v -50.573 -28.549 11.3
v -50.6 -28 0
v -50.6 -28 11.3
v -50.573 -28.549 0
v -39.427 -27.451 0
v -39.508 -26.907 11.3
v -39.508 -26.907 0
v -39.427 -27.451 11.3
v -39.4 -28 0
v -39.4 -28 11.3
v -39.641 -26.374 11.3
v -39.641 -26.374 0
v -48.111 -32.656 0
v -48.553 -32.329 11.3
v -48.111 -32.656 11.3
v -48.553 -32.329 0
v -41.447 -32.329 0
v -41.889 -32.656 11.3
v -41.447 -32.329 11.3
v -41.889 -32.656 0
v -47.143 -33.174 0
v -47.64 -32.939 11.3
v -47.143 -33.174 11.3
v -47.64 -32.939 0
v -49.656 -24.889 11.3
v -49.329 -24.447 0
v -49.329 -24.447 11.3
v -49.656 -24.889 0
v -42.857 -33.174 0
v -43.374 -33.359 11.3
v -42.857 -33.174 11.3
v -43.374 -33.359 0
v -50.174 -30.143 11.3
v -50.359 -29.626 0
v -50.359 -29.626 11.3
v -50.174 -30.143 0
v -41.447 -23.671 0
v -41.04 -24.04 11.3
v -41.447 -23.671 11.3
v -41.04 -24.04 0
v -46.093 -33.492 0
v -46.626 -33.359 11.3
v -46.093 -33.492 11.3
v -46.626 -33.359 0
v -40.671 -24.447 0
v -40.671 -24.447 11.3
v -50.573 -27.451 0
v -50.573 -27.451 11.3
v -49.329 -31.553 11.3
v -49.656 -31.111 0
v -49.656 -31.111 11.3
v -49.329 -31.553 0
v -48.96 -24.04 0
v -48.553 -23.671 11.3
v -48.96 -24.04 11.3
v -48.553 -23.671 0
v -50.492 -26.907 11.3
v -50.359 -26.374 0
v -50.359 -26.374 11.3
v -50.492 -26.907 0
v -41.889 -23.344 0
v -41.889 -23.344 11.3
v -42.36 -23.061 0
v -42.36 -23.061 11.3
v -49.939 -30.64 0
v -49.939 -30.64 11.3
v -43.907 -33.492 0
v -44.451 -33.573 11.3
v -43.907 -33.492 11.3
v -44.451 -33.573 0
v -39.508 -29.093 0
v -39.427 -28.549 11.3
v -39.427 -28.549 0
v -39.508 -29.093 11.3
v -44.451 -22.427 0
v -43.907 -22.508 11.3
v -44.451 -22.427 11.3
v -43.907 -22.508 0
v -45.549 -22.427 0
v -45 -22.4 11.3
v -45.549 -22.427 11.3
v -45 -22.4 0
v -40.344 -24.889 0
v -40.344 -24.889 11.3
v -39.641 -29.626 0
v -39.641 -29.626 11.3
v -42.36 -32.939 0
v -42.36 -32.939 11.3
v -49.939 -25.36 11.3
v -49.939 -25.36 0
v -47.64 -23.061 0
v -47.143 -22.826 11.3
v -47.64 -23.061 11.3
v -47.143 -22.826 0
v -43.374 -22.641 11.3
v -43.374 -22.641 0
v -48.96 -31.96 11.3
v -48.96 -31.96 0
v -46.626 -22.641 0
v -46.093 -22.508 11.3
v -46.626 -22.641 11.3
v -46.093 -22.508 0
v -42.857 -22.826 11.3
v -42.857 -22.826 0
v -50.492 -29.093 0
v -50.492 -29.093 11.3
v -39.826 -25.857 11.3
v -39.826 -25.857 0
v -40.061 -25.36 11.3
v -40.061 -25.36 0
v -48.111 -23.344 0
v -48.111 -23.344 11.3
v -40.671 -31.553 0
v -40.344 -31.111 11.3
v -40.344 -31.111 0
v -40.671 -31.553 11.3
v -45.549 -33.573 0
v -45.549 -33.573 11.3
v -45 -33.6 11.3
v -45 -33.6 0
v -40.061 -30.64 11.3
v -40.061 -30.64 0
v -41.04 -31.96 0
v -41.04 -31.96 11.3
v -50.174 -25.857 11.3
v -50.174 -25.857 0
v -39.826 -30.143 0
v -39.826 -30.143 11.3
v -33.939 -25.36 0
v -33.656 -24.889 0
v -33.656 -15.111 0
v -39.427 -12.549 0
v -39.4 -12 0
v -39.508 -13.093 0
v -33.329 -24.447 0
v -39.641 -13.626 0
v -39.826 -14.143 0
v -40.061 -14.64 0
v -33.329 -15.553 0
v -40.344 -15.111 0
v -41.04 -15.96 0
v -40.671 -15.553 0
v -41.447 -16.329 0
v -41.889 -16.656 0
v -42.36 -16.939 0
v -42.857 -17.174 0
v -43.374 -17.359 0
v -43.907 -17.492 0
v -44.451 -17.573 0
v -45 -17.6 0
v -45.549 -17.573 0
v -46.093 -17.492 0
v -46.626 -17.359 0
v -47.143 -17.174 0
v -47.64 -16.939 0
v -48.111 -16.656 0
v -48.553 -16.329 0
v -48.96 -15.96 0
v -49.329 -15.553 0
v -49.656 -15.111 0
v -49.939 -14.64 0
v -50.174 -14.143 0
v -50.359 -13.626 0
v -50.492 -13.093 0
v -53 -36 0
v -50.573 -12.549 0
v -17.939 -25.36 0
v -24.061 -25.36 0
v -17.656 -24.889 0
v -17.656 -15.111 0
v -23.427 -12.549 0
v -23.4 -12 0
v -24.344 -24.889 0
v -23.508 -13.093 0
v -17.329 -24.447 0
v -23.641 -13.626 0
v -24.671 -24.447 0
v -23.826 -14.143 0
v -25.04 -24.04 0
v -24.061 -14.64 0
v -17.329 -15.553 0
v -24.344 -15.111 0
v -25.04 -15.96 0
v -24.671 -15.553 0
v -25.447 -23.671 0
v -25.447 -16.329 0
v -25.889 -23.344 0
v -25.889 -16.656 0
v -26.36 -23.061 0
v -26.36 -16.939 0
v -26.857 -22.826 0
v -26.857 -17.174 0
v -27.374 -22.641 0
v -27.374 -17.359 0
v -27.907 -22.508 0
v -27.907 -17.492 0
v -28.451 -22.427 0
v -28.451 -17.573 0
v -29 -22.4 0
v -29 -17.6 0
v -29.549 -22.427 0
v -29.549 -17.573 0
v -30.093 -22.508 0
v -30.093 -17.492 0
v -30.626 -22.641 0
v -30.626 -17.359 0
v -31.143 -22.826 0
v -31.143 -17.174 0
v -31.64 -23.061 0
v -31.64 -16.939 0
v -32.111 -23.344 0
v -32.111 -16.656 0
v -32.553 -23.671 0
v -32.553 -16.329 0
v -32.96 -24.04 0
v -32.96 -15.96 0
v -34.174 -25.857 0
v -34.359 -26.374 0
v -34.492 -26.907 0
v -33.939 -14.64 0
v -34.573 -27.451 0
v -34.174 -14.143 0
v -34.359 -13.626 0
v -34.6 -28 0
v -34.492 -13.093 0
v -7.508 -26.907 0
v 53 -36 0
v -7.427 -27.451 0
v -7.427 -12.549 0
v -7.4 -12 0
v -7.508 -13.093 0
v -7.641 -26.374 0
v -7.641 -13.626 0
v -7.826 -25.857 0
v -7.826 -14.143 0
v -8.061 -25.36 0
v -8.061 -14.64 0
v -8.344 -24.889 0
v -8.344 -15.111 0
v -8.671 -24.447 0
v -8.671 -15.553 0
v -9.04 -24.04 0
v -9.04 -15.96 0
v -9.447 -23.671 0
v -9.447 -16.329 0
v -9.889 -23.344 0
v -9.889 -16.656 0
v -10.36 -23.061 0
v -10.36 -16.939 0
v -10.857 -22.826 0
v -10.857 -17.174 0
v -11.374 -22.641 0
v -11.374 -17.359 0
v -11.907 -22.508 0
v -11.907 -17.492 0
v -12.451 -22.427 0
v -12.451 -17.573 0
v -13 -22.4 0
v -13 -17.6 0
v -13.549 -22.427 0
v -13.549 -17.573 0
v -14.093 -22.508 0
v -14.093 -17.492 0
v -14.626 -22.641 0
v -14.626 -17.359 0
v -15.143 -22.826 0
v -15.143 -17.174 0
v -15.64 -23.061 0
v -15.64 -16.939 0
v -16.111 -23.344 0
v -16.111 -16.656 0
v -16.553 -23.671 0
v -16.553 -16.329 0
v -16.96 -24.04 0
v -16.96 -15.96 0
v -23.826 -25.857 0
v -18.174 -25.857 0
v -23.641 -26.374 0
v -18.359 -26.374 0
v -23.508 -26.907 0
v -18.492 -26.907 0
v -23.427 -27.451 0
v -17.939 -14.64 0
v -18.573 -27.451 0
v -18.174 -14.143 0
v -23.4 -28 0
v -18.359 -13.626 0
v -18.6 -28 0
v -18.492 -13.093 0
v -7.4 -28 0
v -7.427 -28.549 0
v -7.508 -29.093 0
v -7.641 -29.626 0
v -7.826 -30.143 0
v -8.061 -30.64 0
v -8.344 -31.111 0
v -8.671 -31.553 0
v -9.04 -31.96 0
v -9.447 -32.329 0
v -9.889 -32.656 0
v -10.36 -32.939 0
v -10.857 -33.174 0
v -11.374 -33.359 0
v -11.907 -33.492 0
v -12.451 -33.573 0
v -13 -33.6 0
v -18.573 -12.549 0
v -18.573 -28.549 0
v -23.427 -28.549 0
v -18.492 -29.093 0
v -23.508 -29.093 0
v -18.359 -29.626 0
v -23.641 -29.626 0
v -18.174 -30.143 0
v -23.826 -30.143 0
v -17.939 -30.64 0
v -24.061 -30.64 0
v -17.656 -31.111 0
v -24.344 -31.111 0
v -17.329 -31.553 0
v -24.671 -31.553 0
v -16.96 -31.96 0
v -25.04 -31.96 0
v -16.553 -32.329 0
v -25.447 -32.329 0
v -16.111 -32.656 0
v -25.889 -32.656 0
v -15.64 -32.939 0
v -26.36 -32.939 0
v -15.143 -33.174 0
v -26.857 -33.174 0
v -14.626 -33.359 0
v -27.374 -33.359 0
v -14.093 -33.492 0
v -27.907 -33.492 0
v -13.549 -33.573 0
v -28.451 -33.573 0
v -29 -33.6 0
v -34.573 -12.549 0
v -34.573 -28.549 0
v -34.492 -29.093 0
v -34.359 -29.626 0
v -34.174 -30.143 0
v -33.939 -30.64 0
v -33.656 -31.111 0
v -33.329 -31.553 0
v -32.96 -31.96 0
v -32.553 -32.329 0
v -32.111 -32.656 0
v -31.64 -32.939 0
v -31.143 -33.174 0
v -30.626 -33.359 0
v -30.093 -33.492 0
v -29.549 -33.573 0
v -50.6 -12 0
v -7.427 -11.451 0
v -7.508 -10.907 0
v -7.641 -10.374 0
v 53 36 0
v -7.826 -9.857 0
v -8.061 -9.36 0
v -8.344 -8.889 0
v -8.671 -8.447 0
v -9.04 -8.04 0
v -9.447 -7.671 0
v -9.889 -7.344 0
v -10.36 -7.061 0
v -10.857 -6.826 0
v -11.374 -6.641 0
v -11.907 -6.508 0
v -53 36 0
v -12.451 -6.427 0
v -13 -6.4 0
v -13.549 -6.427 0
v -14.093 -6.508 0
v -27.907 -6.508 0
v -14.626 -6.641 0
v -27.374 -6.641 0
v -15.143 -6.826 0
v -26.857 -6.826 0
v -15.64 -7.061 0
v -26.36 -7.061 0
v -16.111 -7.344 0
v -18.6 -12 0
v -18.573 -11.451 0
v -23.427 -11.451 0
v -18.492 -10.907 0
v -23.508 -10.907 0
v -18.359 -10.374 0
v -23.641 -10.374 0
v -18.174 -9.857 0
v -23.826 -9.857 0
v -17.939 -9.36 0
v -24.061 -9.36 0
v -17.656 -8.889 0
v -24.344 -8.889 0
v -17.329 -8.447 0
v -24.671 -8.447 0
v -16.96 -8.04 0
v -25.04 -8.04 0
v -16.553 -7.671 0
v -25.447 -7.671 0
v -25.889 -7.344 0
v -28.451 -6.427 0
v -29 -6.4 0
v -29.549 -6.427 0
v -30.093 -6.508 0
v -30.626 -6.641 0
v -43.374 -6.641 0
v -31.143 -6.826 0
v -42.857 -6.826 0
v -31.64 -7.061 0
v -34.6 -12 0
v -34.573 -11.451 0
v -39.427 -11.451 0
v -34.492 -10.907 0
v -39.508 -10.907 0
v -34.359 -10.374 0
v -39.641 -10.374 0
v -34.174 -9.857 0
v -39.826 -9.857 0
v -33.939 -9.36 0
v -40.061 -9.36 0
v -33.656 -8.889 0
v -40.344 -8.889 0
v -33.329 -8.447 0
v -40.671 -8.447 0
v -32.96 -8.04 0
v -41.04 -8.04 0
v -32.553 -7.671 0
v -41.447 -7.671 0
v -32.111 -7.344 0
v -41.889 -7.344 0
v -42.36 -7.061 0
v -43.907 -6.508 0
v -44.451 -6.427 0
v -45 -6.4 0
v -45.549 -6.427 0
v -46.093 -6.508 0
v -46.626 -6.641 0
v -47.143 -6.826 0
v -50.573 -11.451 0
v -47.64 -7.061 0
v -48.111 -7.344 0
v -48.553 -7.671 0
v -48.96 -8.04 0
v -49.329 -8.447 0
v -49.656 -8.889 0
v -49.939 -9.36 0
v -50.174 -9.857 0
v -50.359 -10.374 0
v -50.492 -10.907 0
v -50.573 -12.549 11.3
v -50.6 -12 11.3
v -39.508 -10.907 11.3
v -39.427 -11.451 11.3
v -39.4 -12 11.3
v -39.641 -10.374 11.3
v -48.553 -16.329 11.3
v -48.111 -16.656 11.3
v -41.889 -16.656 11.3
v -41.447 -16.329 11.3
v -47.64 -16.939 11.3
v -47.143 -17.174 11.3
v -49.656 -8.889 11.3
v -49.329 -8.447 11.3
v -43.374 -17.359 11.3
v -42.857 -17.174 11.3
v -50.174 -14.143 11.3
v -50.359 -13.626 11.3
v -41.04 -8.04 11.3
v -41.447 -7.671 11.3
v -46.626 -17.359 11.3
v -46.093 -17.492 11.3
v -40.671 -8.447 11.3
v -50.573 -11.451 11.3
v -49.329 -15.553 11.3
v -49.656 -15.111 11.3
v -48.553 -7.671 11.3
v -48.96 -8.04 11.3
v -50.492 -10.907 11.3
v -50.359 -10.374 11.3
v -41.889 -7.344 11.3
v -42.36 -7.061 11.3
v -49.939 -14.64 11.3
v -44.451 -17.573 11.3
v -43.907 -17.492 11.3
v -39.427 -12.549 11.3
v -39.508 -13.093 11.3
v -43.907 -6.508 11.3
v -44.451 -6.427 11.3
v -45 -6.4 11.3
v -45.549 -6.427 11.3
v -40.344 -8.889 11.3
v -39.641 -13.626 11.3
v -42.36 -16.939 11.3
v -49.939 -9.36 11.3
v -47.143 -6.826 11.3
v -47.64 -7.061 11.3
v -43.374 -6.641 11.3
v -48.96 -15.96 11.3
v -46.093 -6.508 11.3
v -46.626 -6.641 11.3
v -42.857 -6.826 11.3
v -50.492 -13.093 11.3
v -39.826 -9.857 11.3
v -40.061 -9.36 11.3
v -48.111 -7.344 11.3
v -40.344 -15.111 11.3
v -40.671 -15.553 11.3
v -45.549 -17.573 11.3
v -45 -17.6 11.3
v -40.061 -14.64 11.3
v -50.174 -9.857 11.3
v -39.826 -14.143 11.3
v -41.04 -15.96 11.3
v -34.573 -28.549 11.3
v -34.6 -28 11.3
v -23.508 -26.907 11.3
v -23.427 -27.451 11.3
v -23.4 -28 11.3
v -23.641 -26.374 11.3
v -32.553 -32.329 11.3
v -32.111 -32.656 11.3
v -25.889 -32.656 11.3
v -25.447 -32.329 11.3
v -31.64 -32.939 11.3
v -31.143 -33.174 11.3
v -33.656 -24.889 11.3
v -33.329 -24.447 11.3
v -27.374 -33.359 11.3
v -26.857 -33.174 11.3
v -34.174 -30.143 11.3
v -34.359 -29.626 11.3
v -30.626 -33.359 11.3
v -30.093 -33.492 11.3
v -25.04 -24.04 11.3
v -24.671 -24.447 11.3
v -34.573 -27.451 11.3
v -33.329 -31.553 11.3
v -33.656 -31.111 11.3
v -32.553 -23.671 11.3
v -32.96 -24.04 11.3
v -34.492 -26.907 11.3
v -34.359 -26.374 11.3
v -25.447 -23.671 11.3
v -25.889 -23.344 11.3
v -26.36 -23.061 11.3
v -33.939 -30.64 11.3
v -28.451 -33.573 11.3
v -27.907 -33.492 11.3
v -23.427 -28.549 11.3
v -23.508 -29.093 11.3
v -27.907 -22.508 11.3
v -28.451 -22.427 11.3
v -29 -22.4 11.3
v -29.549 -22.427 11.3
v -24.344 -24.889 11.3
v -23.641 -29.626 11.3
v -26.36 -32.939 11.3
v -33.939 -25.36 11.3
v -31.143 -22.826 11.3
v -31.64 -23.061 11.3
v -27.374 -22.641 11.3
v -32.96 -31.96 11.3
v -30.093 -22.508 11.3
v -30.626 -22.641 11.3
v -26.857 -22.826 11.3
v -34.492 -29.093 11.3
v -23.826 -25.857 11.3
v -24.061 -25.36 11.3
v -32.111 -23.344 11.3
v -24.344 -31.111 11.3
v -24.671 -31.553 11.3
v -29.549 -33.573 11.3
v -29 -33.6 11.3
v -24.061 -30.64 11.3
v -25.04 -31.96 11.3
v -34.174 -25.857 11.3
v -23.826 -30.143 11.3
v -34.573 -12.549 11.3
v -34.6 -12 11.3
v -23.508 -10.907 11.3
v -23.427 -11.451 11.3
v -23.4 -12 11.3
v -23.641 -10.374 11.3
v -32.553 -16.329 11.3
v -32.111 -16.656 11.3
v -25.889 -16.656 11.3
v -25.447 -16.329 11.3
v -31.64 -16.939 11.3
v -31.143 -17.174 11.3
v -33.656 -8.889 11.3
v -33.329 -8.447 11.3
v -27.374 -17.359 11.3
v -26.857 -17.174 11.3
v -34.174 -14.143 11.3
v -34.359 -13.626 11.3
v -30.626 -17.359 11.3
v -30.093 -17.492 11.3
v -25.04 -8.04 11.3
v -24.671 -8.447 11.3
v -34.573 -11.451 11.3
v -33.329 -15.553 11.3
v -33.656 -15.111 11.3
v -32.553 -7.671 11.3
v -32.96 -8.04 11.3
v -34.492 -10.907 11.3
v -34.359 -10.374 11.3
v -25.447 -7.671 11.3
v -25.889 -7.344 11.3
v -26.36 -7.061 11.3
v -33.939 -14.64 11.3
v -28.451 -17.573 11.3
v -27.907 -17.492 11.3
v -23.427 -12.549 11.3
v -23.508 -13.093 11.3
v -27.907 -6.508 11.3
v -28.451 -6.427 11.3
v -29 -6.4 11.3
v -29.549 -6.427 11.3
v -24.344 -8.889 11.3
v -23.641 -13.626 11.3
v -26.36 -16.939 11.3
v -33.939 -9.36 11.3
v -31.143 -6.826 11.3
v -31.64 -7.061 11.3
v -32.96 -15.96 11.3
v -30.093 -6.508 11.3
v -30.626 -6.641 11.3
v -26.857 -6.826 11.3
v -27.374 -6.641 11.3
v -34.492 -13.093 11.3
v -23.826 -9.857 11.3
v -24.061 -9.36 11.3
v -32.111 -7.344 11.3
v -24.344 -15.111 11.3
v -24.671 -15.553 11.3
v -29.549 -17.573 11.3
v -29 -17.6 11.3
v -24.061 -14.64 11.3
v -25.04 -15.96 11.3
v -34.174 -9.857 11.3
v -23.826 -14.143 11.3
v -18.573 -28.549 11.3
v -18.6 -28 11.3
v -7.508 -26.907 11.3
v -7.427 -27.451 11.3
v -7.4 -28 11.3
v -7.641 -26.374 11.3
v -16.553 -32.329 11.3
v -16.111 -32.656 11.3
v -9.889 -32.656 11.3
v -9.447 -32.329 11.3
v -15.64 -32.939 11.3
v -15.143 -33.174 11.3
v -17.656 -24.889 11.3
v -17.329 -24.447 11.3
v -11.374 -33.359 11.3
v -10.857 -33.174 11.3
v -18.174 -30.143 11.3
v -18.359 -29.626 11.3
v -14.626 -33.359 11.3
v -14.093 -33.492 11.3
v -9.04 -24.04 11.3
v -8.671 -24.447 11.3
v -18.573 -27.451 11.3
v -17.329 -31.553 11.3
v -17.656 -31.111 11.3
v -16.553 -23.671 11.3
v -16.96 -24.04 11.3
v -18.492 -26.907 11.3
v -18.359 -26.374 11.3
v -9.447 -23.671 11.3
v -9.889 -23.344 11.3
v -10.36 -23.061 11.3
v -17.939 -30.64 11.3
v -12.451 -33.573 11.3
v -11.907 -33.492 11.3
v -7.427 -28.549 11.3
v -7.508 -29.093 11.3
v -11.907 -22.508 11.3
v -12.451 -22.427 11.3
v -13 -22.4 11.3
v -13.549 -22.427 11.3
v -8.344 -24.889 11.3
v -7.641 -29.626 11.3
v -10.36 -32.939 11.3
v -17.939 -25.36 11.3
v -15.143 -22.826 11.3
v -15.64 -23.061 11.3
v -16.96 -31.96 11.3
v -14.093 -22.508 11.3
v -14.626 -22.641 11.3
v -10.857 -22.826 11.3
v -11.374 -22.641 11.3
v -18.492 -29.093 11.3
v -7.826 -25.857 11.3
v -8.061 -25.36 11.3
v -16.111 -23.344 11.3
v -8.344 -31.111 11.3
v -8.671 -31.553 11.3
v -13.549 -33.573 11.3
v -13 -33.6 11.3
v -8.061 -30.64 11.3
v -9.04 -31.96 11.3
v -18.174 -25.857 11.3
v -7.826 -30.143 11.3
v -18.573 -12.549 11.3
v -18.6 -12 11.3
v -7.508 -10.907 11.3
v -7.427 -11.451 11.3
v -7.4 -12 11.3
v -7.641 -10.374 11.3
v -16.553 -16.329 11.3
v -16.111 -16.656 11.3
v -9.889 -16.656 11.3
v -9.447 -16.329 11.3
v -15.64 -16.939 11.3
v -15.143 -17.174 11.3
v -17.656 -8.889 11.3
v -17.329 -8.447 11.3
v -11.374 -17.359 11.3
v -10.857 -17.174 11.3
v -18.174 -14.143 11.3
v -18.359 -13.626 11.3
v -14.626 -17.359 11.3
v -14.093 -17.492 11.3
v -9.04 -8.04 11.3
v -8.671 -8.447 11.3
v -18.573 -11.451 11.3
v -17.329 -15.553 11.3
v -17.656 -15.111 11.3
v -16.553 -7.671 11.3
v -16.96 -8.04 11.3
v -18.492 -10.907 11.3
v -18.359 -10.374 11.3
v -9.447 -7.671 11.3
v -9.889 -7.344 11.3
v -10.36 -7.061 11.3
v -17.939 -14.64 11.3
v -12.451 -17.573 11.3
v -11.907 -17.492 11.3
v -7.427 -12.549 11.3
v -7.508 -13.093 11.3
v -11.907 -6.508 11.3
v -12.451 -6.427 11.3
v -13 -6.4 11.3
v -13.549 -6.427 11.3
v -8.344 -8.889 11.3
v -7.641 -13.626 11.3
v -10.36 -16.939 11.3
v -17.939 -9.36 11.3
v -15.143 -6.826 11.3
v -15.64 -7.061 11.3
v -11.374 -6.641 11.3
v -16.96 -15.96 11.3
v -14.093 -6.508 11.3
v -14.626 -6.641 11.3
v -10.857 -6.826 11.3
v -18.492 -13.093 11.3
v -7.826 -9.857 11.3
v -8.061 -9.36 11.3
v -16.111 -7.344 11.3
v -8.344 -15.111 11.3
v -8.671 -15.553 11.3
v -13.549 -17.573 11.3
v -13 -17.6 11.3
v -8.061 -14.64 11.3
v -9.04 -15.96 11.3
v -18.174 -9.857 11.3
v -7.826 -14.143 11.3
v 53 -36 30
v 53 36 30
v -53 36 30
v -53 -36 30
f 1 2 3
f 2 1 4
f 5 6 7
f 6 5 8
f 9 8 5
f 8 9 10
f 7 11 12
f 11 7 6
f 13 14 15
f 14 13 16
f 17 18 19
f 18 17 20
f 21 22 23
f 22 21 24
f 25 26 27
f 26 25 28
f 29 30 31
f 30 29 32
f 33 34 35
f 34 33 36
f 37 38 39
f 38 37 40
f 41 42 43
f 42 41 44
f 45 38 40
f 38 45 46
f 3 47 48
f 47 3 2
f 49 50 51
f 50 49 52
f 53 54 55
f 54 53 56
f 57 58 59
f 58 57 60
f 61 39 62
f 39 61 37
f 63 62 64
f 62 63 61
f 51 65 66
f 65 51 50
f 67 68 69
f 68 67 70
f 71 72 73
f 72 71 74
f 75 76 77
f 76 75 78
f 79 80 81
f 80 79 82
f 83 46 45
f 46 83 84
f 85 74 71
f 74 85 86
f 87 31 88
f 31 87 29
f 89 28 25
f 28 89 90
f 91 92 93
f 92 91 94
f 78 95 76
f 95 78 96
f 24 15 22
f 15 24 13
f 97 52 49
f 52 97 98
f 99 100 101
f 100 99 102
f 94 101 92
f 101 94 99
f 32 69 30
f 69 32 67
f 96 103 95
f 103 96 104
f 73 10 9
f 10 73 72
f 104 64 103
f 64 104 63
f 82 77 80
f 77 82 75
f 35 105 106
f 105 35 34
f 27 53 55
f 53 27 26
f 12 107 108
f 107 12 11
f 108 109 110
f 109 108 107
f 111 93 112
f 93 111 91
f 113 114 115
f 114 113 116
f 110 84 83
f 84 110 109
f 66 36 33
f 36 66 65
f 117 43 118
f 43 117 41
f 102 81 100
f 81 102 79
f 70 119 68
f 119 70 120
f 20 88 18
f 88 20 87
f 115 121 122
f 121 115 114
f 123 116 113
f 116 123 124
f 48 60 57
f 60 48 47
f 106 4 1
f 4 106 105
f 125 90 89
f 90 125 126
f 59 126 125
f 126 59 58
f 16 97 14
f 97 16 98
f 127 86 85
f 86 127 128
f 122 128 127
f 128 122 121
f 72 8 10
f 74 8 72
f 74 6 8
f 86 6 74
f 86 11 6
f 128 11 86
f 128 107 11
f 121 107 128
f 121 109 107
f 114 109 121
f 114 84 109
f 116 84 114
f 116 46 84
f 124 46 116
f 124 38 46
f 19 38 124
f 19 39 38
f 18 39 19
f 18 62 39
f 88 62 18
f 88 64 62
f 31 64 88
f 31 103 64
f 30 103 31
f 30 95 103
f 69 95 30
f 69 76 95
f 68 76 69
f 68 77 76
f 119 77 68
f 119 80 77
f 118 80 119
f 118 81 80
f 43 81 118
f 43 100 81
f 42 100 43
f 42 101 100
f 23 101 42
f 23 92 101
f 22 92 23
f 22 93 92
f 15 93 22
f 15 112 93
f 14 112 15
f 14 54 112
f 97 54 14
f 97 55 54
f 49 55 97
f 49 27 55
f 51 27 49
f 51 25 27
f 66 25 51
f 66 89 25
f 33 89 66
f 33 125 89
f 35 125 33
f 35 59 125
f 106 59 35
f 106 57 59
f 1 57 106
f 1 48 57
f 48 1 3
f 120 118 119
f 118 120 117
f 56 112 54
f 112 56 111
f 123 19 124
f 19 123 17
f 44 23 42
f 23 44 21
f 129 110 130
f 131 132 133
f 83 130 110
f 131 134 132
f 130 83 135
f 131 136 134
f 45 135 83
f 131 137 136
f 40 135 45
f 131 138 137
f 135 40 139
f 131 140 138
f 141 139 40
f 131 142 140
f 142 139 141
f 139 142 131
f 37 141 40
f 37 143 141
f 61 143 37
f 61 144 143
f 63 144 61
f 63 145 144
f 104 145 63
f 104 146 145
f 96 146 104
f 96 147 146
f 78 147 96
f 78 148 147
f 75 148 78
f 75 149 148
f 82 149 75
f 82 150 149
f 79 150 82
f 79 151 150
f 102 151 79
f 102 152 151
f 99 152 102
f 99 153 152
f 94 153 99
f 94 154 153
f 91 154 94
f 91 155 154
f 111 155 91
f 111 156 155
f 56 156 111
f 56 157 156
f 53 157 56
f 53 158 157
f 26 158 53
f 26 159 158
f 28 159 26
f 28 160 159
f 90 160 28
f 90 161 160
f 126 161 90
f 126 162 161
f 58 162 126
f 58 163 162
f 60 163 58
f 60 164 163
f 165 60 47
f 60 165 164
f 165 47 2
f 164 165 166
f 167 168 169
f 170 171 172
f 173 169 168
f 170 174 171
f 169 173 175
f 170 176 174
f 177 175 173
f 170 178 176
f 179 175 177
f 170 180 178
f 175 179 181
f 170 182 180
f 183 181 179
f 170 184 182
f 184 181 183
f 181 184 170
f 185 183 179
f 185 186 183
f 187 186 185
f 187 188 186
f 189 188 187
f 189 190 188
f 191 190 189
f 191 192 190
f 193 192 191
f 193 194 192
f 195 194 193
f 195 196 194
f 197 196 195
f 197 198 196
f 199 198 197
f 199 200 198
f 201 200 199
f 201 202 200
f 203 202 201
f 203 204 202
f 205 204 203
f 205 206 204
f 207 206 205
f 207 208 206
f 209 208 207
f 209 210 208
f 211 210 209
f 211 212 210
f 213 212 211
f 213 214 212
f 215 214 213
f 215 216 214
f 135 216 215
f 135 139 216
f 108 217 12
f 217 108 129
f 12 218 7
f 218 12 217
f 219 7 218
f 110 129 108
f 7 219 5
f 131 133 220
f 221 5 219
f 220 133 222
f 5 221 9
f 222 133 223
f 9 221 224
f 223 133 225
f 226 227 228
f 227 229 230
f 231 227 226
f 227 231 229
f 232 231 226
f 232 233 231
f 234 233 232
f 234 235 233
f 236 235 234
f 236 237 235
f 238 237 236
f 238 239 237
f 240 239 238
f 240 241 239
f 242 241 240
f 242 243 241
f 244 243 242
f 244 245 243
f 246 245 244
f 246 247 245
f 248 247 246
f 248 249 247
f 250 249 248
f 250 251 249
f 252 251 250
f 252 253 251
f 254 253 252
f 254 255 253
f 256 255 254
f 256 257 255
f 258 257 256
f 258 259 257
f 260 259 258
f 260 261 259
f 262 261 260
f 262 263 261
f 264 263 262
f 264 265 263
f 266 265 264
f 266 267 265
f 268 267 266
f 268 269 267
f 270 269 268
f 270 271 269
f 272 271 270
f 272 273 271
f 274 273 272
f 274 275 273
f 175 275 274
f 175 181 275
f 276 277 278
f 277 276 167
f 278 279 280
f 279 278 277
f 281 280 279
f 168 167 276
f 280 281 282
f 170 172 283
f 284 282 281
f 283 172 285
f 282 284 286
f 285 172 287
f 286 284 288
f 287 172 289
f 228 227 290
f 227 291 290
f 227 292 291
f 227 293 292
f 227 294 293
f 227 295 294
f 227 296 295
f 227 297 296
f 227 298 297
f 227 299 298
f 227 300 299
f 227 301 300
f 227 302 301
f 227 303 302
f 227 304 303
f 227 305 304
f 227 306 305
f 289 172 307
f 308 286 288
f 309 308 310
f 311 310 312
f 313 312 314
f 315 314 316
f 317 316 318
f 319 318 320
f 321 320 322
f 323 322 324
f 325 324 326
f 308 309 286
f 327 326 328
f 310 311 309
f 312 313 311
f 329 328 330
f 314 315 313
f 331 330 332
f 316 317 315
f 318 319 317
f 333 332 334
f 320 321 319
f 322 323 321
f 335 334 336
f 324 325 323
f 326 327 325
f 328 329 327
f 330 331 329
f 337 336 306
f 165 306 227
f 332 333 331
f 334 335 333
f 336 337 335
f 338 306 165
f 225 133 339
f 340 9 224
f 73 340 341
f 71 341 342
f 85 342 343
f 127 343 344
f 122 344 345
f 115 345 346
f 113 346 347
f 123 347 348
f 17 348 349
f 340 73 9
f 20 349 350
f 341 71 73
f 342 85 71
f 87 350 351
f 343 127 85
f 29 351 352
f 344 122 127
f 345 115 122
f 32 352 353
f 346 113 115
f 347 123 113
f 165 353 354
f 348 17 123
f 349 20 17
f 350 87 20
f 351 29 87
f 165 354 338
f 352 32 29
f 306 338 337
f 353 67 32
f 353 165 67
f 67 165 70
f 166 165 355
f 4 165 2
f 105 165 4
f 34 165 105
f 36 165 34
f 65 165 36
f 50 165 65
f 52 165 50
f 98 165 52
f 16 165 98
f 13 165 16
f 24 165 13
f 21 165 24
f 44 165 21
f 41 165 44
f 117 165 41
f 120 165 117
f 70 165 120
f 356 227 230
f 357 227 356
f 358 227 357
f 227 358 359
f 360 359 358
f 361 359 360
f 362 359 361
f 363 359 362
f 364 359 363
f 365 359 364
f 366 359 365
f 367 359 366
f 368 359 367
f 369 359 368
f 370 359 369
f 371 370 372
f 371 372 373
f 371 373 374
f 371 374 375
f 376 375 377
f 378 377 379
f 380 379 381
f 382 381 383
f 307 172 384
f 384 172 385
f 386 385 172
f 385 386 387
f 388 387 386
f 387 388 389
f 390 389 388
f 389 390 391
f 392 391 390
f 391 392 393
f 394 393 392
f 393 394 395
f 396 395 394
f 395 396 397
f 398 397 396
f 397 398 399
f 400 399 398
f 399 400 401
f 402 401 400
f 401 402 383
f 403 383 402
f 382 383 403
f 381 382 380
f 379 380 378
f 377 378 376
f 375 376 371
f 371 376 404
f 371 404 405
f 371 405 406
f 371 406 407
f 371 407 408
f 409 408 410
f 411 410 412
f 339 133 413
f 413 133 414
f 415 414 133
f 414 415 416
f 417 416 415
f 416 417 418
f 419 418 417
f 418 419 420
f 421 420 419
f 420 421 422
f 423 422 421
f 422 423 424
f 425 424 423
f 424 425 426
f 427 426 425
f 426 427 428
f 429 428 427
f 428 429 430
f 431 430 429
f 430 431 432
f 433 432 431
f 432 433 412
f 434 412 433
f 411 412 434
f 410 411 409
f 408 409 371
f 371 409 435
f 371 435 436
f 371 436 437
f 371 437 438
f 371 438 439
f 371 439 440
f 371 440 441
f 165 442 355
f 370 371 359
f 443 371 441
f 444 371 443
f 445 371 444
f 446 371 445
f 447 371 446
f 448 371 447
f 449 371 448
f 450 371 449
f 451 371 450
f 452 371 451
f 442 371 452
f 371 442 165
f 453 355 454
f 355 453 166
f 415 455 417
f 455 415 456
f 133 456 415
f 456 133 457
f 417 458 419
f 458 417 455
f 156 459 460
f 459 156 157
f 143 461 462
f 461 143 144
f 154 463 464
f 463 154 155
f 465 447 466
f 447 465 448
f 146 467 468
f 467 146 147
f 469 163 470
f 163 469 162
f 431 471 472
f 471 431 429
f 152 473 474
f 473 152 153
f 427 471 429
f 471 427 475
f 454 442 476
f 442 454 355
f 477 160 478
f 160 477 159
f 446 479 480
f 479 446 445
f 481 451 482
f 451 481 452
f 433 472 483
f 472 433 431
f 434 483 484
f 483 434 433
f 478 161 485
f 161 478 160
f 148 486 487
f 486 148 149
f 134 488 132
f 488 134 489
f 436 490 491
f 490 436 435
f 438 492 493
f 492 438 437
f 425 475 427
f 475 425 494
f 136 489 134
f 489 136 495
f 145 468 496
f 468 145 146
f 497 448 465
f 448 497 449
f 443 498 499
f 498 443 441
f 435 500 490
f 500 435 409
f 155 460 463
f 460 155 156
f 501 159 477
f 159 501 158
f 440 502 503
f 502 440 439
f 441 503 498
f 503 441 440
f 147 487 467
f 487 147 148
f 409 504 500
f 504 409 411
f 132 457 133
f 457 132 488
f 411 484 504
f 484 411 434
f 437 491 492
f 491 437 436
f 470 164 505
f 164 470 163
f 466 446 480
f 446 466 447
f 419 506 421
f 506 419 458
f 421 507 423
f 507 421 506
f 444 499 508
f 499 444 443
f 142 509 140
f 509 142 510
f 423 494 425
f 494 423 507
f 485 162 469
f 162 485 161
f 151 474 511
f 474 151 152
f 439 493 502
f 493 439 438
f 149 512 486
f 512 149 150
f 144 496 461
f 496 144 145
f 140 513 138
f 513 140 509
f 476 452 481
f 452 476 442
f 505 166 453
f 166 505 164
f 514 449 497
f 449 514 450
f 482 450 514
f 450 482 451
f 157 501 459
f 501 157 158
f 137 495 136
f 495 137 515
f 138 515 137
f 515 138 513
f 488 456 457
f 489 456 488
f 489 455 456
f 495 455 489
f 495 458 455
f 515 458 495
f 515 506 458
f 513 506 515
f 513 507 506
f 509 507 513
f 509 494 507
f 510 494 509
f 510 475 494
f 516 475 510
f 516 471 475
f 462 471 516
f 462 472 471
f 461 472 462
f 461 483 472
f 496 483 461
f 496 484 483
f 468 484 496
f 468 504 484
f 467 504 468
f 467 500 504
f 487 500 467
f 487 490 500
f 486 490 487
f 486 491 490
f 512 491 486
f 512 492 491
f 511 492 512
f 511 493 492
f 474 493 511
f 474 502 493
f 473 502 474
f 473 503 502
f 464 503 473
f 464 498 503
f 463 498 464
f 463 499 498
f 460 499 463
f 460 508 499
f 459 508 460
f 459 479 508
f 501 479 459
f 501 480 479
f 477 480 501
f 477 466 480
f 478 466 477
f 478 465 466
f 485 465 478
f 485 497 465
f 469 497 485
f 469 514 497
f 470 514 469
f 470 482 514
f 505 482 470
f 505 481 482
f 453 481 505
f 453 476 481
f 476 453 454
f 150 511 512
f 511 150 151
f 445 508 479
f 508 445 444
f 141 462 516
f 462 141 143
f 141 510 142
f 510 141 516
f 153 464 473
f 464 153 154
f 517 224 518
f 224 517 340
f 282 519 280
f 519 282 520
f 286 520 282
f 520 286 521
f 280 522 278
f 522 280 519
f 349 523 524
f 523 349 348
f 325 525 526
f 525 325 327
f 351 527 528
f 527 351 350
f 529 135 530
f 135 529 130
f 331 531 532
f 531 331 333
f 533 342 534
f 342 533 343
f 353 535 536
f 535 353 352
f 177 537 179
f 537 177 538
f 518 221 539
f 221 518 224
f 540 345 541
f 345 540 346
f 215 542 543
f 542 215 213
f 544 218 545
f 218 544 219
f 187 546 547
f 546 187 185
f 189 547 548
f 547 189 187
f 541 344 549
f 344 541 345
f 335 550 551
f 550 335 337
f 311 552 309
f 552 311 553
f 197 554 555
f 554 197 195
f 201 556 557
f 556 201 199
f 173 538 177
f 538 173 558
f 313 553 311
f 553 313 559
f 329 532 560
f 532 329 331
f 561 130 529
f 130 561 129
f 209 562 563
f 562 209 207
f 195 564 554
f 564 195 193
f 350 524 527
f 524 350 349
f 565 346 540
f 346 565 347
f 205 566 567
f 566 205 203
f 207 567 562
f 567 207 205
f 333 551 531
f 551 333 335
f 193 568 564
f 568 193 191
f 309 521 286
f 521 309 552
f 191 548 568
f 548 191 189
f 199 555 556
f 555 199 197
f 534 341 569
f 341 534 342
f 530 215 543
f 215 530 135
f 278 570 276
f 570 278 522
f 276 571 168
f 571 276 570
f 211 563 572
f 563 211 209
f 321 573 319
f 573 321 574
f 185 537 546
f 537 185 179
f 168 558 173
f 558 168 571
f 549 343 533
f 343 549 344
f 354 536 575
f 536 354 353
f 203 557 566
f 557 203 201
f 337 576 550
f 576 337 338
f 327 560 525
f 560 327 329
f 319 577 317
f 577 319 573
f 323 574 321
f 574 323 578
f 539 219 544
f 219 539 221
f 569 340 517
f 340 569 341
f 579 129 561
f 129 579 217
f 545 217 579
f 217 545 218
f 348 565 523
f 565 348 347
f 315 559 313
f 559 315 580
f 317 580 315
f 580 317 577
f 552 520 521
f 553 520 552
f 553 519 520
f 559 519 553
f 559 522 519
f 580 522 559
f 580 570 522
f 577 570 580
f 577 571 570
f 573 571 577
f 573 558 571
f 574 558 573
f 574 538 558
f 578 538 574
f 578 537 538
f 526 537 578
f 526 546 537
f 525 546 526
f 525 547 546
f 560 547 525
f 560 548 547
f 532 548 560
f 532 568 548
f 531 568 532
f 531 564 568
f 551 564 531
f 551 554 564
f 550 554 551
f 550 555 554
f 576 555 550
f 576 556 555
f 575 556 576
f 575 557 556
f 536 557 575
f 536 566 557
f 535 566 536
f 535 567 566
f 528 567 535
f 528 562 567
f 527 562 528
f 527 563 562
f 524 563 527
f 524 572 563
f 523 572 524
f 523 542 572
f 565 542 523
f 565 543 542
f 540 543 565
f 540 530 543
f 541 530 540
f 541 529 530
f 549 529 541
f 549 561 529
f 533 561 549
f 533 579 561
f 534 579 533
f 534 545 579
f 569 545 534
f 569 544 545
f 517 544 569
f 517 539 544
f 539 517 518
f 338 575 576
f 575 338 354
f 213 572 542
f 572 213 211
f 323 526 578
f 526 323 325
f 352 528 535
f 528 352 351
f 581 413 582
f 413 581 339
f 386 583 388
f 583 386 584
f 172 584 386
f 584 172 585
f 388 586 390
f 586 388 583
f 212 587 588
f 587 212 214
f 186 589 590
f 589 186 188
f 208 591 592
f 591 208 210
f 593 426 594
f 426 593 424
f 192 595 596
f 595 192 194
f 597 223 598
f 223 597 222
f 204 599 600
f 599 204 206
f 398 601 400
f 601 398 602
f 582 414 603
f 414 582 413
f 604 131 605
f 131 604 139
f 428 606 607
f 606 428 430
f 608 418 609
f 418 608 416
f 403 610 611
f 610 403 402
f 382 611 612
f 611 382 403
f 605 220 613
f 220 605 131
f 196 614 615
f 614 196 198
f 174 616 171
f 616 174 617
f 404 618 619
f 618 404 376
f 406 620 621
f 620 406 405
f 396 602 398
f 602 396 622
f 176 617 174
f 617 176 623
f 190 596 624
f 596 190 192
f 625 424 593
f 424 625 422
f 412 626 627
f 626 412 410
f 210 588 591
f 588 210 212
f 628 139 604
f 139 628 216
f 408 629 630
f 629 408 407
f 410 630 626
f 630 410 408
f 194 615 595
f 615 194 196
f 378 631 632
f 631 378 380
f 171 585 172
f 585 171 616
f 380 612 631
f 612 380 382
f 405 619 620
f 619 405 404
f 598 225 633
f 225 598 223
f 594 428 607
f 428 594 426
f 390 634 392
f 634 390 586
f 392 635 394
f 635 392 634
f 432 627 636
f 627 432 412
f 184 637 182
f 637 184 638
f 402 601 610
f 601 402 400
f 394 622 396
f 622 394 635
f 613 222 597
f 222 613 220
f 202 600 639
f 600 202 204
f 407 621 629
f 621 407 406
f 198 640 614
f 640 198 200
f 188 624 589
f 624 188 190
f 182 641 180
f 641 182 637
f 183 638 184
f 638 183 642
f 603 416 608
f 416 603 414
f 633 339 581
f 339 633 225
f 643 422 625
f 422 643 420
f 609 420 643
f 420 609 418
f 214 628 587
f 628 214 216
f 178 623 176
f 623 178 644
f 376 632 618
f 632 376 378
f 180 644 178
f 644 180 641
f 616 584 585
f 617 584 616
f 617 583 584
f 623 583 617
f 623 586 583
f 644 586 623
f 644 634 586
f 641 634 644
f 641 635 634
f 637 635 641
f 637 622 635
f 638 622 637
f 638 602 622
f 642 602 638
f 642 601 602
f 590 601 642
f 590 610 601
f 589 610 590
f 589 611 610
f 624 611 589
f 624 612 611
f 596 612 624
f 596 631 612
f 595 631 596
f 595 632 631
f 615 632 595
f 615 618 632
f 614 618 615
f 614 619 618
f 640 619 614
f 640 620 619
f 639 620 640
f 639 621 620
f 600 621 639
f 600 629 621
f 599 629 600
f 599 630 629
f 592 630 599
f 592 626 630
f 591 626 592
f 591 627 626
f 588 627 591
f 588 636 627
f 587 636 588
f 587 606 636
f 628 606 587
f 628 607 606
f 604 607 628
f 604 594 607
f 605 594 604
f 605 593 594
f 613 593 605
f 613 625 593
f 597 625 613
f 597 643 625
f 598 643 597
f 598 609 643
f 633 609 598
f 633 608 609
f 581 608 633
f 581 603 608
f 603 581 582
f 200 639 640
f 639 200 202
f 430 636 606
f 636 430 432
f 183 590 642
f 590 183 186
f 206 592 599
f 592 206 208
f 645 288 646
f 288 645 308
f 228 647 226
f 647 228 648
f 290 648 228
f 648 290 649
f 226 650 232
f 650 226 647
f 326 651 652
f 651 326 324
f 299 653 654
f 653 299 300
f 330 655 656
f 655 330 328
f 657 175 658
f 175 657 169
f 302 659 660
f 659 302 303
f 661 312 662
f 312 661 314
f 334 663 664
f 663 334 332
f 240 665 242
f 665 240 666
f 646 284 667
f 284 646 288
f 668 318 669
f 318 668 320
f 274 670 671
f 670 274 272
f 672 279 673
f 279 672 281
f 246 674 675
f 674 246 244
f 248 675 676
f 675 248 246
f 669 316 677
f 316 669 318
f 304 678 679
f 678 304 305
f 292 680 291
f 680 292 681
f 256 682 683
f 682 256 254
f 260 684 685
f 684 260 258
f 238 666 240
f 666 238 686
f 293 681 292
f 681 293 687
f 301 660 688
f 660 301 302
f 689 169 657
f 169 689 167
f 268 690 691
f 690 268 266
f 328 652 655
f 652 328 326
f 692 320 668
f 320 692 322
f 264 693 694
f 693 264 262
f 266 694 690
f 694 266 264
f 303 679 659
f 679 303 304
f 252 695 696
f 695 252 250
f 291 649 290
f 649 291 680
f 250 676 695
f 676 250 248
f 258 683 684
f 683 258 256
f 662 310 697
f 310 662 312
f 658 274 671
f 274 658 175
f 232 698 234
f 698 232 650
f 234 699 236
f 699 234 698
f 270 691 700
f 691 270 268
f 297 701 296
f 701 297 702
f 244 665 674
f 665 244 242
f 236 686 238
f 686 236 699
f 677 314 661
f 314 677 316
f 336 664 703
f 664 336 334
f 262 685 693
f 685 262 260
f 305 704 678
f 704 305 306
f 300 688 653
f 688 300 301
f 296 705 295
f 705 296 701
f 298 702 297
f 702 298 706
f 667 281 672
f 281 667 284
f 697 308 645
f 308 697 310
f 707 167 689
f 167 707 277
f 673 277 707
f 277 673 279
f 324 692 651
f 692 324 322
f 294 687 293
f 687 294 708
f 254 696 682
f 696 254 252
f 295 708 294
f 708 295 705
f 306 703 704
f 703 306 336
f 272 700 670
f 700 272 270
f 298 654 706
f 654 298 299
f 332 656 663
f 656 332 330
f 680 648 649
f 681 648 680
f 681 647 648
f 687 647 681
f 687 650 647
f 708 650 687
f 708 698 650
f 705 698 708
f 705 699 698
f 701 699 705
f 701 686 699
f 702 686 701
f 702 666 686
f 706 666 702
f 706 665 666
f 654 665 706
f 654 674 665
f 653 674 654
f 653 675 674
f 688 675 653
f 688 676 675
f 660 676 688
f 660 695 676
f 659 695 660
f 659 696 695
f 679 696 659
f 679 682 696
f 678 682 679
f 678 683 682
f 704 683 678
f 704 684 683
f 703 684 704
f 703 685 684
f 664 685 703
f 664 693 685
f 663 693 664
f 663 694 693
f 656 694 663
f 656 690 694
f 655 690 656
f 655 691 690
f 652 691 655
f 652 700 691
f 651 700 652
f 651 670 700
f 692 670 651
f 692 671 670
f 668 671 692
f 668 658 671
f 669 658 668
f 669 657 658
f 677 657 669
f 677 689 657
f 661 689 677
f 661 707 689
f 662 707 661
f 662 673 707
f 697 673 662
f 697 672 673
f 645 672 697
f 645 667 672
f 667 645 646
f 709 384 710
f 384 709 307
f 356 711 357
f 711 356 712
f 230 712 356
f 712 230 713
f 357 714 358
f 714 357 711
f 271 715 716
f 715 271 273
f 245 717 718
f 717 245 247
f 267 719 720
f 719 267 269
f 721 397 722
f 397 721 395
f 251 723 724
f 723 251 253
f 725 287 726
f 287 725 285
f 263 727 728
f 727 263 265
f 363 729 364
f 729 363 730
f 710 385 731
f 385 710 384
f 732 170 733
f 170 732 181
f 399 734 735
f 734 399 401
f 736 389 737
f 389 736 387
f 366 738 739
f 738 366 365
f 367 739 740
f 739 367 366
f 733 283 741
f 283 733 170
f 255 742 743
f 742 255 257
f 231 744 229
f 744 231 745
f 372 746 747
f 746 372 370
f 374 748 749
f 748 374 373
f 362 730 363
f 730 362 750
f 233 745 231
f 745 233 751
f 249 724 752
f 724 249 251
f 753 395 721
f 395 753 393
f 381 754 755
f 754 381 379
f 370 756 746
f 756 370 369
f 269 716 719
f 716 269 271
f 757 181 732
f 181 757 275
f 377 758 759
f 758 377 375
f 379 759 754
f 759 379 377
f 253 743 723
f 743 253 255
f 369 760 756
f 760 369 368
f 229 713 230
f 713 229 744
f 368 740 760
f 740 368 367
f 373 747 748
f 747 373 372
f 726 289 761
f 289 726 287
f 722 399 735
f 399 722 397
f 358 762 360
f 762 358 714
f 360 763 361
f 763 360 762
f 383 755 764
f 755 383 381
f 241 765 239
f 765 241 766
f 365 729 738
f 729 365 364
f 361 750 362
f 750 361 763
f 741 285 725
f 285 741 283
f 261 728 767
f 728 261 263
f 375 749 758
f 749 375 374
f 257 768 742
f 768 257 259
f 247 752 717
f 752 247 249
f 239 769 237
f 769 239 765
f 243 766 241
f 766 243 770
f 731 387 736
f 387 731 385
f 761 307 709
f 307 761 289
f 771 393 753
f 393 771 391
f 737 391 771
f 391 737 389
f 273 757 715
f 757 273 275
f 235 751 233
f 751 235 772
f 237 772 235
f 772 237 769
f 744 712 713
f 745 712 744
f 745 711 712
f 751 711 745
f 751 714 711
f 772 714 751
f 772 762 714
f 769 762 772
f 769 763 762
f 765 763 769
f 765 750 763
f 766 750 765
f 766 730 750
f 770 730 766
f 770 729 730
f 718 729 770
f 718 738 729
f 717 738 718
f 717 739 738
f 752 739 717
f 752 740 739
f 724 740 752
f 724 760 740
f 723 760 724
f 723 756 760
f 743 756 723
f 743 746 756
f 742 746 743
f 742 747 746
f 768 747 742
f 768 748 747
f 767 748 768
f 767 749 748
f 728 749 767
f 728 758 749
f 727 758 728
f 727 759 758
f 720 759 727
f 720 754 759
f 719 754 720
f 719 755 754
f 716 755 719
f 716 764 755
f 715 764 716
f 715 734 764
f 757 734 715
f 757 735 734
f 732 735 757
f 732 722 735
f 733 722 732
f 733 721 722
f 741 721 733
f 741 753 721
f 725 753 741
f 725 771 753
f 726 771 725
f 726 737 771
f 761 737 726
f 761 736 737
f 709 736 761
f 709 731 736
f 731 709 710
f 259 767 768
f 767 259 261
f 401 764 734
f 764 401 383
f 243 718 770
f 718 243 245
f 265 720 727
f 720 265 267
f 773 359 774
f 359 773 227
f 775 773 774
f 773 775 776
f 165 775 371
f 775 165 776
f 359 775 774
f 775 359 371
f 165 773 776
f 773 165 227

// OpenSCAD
// Bench rack for 1.5 mL microcentrifuge tubes.
// Solid block 106x72x30 mm with 24 vertical holes (4 rows x 6 columns).
// Holes are 11.2 mm diameter, 25 mm deep, centred on the block.

L     = 106;   // Length (X)
W     = 72;    // Width (Y)
H     = 30;    // Height (Z)
n_x   = 6;     // Number of holes along X
n_y   = 4;     // Number of holes along Y
p_x   = 16;    // Pitch along X
p_y   = 16;    // Pitch along Y
d_h   = 11.2;  // Hole diameter
d_h_d = 11.2;  // Hole depth (depth of the cut)

$fn = 64;

// Calculate positions for the hole grid centred on the block
// X positions: 0 to n_x-1
// Y positions: 0 to n_y-1
// Offset to centre: (n-1)/2 * pitch
offset_x = (n_x - 1) * p_x / 2;
offset_y = (n_y - 1) * p_y / 2;

difference() {
    // Main block
    translate([-L / 2, -W / 2, 0]) cube([L, W, H]);

    // Holes
    for (i = [0 : n_x - 1]) {
        for (j = [0 : n_y - 1]) {
            // Calculate position for this hole
            pos_x = -L / 2 + (i - offset_x / p_x) * p_x;
            pos_y = -W / 2 + (j - offset_y / p_y) * p_y;
            
            // Hole cylinder: 11.2mm diameter, 25mm deep
            // Extend slightly past the bottom face to ensure clean cut
            translate([pos_x, pos_y, 0]) 
                cylinder(h = d_h_d + 0.1, d = d_h);
        }
    }
}
